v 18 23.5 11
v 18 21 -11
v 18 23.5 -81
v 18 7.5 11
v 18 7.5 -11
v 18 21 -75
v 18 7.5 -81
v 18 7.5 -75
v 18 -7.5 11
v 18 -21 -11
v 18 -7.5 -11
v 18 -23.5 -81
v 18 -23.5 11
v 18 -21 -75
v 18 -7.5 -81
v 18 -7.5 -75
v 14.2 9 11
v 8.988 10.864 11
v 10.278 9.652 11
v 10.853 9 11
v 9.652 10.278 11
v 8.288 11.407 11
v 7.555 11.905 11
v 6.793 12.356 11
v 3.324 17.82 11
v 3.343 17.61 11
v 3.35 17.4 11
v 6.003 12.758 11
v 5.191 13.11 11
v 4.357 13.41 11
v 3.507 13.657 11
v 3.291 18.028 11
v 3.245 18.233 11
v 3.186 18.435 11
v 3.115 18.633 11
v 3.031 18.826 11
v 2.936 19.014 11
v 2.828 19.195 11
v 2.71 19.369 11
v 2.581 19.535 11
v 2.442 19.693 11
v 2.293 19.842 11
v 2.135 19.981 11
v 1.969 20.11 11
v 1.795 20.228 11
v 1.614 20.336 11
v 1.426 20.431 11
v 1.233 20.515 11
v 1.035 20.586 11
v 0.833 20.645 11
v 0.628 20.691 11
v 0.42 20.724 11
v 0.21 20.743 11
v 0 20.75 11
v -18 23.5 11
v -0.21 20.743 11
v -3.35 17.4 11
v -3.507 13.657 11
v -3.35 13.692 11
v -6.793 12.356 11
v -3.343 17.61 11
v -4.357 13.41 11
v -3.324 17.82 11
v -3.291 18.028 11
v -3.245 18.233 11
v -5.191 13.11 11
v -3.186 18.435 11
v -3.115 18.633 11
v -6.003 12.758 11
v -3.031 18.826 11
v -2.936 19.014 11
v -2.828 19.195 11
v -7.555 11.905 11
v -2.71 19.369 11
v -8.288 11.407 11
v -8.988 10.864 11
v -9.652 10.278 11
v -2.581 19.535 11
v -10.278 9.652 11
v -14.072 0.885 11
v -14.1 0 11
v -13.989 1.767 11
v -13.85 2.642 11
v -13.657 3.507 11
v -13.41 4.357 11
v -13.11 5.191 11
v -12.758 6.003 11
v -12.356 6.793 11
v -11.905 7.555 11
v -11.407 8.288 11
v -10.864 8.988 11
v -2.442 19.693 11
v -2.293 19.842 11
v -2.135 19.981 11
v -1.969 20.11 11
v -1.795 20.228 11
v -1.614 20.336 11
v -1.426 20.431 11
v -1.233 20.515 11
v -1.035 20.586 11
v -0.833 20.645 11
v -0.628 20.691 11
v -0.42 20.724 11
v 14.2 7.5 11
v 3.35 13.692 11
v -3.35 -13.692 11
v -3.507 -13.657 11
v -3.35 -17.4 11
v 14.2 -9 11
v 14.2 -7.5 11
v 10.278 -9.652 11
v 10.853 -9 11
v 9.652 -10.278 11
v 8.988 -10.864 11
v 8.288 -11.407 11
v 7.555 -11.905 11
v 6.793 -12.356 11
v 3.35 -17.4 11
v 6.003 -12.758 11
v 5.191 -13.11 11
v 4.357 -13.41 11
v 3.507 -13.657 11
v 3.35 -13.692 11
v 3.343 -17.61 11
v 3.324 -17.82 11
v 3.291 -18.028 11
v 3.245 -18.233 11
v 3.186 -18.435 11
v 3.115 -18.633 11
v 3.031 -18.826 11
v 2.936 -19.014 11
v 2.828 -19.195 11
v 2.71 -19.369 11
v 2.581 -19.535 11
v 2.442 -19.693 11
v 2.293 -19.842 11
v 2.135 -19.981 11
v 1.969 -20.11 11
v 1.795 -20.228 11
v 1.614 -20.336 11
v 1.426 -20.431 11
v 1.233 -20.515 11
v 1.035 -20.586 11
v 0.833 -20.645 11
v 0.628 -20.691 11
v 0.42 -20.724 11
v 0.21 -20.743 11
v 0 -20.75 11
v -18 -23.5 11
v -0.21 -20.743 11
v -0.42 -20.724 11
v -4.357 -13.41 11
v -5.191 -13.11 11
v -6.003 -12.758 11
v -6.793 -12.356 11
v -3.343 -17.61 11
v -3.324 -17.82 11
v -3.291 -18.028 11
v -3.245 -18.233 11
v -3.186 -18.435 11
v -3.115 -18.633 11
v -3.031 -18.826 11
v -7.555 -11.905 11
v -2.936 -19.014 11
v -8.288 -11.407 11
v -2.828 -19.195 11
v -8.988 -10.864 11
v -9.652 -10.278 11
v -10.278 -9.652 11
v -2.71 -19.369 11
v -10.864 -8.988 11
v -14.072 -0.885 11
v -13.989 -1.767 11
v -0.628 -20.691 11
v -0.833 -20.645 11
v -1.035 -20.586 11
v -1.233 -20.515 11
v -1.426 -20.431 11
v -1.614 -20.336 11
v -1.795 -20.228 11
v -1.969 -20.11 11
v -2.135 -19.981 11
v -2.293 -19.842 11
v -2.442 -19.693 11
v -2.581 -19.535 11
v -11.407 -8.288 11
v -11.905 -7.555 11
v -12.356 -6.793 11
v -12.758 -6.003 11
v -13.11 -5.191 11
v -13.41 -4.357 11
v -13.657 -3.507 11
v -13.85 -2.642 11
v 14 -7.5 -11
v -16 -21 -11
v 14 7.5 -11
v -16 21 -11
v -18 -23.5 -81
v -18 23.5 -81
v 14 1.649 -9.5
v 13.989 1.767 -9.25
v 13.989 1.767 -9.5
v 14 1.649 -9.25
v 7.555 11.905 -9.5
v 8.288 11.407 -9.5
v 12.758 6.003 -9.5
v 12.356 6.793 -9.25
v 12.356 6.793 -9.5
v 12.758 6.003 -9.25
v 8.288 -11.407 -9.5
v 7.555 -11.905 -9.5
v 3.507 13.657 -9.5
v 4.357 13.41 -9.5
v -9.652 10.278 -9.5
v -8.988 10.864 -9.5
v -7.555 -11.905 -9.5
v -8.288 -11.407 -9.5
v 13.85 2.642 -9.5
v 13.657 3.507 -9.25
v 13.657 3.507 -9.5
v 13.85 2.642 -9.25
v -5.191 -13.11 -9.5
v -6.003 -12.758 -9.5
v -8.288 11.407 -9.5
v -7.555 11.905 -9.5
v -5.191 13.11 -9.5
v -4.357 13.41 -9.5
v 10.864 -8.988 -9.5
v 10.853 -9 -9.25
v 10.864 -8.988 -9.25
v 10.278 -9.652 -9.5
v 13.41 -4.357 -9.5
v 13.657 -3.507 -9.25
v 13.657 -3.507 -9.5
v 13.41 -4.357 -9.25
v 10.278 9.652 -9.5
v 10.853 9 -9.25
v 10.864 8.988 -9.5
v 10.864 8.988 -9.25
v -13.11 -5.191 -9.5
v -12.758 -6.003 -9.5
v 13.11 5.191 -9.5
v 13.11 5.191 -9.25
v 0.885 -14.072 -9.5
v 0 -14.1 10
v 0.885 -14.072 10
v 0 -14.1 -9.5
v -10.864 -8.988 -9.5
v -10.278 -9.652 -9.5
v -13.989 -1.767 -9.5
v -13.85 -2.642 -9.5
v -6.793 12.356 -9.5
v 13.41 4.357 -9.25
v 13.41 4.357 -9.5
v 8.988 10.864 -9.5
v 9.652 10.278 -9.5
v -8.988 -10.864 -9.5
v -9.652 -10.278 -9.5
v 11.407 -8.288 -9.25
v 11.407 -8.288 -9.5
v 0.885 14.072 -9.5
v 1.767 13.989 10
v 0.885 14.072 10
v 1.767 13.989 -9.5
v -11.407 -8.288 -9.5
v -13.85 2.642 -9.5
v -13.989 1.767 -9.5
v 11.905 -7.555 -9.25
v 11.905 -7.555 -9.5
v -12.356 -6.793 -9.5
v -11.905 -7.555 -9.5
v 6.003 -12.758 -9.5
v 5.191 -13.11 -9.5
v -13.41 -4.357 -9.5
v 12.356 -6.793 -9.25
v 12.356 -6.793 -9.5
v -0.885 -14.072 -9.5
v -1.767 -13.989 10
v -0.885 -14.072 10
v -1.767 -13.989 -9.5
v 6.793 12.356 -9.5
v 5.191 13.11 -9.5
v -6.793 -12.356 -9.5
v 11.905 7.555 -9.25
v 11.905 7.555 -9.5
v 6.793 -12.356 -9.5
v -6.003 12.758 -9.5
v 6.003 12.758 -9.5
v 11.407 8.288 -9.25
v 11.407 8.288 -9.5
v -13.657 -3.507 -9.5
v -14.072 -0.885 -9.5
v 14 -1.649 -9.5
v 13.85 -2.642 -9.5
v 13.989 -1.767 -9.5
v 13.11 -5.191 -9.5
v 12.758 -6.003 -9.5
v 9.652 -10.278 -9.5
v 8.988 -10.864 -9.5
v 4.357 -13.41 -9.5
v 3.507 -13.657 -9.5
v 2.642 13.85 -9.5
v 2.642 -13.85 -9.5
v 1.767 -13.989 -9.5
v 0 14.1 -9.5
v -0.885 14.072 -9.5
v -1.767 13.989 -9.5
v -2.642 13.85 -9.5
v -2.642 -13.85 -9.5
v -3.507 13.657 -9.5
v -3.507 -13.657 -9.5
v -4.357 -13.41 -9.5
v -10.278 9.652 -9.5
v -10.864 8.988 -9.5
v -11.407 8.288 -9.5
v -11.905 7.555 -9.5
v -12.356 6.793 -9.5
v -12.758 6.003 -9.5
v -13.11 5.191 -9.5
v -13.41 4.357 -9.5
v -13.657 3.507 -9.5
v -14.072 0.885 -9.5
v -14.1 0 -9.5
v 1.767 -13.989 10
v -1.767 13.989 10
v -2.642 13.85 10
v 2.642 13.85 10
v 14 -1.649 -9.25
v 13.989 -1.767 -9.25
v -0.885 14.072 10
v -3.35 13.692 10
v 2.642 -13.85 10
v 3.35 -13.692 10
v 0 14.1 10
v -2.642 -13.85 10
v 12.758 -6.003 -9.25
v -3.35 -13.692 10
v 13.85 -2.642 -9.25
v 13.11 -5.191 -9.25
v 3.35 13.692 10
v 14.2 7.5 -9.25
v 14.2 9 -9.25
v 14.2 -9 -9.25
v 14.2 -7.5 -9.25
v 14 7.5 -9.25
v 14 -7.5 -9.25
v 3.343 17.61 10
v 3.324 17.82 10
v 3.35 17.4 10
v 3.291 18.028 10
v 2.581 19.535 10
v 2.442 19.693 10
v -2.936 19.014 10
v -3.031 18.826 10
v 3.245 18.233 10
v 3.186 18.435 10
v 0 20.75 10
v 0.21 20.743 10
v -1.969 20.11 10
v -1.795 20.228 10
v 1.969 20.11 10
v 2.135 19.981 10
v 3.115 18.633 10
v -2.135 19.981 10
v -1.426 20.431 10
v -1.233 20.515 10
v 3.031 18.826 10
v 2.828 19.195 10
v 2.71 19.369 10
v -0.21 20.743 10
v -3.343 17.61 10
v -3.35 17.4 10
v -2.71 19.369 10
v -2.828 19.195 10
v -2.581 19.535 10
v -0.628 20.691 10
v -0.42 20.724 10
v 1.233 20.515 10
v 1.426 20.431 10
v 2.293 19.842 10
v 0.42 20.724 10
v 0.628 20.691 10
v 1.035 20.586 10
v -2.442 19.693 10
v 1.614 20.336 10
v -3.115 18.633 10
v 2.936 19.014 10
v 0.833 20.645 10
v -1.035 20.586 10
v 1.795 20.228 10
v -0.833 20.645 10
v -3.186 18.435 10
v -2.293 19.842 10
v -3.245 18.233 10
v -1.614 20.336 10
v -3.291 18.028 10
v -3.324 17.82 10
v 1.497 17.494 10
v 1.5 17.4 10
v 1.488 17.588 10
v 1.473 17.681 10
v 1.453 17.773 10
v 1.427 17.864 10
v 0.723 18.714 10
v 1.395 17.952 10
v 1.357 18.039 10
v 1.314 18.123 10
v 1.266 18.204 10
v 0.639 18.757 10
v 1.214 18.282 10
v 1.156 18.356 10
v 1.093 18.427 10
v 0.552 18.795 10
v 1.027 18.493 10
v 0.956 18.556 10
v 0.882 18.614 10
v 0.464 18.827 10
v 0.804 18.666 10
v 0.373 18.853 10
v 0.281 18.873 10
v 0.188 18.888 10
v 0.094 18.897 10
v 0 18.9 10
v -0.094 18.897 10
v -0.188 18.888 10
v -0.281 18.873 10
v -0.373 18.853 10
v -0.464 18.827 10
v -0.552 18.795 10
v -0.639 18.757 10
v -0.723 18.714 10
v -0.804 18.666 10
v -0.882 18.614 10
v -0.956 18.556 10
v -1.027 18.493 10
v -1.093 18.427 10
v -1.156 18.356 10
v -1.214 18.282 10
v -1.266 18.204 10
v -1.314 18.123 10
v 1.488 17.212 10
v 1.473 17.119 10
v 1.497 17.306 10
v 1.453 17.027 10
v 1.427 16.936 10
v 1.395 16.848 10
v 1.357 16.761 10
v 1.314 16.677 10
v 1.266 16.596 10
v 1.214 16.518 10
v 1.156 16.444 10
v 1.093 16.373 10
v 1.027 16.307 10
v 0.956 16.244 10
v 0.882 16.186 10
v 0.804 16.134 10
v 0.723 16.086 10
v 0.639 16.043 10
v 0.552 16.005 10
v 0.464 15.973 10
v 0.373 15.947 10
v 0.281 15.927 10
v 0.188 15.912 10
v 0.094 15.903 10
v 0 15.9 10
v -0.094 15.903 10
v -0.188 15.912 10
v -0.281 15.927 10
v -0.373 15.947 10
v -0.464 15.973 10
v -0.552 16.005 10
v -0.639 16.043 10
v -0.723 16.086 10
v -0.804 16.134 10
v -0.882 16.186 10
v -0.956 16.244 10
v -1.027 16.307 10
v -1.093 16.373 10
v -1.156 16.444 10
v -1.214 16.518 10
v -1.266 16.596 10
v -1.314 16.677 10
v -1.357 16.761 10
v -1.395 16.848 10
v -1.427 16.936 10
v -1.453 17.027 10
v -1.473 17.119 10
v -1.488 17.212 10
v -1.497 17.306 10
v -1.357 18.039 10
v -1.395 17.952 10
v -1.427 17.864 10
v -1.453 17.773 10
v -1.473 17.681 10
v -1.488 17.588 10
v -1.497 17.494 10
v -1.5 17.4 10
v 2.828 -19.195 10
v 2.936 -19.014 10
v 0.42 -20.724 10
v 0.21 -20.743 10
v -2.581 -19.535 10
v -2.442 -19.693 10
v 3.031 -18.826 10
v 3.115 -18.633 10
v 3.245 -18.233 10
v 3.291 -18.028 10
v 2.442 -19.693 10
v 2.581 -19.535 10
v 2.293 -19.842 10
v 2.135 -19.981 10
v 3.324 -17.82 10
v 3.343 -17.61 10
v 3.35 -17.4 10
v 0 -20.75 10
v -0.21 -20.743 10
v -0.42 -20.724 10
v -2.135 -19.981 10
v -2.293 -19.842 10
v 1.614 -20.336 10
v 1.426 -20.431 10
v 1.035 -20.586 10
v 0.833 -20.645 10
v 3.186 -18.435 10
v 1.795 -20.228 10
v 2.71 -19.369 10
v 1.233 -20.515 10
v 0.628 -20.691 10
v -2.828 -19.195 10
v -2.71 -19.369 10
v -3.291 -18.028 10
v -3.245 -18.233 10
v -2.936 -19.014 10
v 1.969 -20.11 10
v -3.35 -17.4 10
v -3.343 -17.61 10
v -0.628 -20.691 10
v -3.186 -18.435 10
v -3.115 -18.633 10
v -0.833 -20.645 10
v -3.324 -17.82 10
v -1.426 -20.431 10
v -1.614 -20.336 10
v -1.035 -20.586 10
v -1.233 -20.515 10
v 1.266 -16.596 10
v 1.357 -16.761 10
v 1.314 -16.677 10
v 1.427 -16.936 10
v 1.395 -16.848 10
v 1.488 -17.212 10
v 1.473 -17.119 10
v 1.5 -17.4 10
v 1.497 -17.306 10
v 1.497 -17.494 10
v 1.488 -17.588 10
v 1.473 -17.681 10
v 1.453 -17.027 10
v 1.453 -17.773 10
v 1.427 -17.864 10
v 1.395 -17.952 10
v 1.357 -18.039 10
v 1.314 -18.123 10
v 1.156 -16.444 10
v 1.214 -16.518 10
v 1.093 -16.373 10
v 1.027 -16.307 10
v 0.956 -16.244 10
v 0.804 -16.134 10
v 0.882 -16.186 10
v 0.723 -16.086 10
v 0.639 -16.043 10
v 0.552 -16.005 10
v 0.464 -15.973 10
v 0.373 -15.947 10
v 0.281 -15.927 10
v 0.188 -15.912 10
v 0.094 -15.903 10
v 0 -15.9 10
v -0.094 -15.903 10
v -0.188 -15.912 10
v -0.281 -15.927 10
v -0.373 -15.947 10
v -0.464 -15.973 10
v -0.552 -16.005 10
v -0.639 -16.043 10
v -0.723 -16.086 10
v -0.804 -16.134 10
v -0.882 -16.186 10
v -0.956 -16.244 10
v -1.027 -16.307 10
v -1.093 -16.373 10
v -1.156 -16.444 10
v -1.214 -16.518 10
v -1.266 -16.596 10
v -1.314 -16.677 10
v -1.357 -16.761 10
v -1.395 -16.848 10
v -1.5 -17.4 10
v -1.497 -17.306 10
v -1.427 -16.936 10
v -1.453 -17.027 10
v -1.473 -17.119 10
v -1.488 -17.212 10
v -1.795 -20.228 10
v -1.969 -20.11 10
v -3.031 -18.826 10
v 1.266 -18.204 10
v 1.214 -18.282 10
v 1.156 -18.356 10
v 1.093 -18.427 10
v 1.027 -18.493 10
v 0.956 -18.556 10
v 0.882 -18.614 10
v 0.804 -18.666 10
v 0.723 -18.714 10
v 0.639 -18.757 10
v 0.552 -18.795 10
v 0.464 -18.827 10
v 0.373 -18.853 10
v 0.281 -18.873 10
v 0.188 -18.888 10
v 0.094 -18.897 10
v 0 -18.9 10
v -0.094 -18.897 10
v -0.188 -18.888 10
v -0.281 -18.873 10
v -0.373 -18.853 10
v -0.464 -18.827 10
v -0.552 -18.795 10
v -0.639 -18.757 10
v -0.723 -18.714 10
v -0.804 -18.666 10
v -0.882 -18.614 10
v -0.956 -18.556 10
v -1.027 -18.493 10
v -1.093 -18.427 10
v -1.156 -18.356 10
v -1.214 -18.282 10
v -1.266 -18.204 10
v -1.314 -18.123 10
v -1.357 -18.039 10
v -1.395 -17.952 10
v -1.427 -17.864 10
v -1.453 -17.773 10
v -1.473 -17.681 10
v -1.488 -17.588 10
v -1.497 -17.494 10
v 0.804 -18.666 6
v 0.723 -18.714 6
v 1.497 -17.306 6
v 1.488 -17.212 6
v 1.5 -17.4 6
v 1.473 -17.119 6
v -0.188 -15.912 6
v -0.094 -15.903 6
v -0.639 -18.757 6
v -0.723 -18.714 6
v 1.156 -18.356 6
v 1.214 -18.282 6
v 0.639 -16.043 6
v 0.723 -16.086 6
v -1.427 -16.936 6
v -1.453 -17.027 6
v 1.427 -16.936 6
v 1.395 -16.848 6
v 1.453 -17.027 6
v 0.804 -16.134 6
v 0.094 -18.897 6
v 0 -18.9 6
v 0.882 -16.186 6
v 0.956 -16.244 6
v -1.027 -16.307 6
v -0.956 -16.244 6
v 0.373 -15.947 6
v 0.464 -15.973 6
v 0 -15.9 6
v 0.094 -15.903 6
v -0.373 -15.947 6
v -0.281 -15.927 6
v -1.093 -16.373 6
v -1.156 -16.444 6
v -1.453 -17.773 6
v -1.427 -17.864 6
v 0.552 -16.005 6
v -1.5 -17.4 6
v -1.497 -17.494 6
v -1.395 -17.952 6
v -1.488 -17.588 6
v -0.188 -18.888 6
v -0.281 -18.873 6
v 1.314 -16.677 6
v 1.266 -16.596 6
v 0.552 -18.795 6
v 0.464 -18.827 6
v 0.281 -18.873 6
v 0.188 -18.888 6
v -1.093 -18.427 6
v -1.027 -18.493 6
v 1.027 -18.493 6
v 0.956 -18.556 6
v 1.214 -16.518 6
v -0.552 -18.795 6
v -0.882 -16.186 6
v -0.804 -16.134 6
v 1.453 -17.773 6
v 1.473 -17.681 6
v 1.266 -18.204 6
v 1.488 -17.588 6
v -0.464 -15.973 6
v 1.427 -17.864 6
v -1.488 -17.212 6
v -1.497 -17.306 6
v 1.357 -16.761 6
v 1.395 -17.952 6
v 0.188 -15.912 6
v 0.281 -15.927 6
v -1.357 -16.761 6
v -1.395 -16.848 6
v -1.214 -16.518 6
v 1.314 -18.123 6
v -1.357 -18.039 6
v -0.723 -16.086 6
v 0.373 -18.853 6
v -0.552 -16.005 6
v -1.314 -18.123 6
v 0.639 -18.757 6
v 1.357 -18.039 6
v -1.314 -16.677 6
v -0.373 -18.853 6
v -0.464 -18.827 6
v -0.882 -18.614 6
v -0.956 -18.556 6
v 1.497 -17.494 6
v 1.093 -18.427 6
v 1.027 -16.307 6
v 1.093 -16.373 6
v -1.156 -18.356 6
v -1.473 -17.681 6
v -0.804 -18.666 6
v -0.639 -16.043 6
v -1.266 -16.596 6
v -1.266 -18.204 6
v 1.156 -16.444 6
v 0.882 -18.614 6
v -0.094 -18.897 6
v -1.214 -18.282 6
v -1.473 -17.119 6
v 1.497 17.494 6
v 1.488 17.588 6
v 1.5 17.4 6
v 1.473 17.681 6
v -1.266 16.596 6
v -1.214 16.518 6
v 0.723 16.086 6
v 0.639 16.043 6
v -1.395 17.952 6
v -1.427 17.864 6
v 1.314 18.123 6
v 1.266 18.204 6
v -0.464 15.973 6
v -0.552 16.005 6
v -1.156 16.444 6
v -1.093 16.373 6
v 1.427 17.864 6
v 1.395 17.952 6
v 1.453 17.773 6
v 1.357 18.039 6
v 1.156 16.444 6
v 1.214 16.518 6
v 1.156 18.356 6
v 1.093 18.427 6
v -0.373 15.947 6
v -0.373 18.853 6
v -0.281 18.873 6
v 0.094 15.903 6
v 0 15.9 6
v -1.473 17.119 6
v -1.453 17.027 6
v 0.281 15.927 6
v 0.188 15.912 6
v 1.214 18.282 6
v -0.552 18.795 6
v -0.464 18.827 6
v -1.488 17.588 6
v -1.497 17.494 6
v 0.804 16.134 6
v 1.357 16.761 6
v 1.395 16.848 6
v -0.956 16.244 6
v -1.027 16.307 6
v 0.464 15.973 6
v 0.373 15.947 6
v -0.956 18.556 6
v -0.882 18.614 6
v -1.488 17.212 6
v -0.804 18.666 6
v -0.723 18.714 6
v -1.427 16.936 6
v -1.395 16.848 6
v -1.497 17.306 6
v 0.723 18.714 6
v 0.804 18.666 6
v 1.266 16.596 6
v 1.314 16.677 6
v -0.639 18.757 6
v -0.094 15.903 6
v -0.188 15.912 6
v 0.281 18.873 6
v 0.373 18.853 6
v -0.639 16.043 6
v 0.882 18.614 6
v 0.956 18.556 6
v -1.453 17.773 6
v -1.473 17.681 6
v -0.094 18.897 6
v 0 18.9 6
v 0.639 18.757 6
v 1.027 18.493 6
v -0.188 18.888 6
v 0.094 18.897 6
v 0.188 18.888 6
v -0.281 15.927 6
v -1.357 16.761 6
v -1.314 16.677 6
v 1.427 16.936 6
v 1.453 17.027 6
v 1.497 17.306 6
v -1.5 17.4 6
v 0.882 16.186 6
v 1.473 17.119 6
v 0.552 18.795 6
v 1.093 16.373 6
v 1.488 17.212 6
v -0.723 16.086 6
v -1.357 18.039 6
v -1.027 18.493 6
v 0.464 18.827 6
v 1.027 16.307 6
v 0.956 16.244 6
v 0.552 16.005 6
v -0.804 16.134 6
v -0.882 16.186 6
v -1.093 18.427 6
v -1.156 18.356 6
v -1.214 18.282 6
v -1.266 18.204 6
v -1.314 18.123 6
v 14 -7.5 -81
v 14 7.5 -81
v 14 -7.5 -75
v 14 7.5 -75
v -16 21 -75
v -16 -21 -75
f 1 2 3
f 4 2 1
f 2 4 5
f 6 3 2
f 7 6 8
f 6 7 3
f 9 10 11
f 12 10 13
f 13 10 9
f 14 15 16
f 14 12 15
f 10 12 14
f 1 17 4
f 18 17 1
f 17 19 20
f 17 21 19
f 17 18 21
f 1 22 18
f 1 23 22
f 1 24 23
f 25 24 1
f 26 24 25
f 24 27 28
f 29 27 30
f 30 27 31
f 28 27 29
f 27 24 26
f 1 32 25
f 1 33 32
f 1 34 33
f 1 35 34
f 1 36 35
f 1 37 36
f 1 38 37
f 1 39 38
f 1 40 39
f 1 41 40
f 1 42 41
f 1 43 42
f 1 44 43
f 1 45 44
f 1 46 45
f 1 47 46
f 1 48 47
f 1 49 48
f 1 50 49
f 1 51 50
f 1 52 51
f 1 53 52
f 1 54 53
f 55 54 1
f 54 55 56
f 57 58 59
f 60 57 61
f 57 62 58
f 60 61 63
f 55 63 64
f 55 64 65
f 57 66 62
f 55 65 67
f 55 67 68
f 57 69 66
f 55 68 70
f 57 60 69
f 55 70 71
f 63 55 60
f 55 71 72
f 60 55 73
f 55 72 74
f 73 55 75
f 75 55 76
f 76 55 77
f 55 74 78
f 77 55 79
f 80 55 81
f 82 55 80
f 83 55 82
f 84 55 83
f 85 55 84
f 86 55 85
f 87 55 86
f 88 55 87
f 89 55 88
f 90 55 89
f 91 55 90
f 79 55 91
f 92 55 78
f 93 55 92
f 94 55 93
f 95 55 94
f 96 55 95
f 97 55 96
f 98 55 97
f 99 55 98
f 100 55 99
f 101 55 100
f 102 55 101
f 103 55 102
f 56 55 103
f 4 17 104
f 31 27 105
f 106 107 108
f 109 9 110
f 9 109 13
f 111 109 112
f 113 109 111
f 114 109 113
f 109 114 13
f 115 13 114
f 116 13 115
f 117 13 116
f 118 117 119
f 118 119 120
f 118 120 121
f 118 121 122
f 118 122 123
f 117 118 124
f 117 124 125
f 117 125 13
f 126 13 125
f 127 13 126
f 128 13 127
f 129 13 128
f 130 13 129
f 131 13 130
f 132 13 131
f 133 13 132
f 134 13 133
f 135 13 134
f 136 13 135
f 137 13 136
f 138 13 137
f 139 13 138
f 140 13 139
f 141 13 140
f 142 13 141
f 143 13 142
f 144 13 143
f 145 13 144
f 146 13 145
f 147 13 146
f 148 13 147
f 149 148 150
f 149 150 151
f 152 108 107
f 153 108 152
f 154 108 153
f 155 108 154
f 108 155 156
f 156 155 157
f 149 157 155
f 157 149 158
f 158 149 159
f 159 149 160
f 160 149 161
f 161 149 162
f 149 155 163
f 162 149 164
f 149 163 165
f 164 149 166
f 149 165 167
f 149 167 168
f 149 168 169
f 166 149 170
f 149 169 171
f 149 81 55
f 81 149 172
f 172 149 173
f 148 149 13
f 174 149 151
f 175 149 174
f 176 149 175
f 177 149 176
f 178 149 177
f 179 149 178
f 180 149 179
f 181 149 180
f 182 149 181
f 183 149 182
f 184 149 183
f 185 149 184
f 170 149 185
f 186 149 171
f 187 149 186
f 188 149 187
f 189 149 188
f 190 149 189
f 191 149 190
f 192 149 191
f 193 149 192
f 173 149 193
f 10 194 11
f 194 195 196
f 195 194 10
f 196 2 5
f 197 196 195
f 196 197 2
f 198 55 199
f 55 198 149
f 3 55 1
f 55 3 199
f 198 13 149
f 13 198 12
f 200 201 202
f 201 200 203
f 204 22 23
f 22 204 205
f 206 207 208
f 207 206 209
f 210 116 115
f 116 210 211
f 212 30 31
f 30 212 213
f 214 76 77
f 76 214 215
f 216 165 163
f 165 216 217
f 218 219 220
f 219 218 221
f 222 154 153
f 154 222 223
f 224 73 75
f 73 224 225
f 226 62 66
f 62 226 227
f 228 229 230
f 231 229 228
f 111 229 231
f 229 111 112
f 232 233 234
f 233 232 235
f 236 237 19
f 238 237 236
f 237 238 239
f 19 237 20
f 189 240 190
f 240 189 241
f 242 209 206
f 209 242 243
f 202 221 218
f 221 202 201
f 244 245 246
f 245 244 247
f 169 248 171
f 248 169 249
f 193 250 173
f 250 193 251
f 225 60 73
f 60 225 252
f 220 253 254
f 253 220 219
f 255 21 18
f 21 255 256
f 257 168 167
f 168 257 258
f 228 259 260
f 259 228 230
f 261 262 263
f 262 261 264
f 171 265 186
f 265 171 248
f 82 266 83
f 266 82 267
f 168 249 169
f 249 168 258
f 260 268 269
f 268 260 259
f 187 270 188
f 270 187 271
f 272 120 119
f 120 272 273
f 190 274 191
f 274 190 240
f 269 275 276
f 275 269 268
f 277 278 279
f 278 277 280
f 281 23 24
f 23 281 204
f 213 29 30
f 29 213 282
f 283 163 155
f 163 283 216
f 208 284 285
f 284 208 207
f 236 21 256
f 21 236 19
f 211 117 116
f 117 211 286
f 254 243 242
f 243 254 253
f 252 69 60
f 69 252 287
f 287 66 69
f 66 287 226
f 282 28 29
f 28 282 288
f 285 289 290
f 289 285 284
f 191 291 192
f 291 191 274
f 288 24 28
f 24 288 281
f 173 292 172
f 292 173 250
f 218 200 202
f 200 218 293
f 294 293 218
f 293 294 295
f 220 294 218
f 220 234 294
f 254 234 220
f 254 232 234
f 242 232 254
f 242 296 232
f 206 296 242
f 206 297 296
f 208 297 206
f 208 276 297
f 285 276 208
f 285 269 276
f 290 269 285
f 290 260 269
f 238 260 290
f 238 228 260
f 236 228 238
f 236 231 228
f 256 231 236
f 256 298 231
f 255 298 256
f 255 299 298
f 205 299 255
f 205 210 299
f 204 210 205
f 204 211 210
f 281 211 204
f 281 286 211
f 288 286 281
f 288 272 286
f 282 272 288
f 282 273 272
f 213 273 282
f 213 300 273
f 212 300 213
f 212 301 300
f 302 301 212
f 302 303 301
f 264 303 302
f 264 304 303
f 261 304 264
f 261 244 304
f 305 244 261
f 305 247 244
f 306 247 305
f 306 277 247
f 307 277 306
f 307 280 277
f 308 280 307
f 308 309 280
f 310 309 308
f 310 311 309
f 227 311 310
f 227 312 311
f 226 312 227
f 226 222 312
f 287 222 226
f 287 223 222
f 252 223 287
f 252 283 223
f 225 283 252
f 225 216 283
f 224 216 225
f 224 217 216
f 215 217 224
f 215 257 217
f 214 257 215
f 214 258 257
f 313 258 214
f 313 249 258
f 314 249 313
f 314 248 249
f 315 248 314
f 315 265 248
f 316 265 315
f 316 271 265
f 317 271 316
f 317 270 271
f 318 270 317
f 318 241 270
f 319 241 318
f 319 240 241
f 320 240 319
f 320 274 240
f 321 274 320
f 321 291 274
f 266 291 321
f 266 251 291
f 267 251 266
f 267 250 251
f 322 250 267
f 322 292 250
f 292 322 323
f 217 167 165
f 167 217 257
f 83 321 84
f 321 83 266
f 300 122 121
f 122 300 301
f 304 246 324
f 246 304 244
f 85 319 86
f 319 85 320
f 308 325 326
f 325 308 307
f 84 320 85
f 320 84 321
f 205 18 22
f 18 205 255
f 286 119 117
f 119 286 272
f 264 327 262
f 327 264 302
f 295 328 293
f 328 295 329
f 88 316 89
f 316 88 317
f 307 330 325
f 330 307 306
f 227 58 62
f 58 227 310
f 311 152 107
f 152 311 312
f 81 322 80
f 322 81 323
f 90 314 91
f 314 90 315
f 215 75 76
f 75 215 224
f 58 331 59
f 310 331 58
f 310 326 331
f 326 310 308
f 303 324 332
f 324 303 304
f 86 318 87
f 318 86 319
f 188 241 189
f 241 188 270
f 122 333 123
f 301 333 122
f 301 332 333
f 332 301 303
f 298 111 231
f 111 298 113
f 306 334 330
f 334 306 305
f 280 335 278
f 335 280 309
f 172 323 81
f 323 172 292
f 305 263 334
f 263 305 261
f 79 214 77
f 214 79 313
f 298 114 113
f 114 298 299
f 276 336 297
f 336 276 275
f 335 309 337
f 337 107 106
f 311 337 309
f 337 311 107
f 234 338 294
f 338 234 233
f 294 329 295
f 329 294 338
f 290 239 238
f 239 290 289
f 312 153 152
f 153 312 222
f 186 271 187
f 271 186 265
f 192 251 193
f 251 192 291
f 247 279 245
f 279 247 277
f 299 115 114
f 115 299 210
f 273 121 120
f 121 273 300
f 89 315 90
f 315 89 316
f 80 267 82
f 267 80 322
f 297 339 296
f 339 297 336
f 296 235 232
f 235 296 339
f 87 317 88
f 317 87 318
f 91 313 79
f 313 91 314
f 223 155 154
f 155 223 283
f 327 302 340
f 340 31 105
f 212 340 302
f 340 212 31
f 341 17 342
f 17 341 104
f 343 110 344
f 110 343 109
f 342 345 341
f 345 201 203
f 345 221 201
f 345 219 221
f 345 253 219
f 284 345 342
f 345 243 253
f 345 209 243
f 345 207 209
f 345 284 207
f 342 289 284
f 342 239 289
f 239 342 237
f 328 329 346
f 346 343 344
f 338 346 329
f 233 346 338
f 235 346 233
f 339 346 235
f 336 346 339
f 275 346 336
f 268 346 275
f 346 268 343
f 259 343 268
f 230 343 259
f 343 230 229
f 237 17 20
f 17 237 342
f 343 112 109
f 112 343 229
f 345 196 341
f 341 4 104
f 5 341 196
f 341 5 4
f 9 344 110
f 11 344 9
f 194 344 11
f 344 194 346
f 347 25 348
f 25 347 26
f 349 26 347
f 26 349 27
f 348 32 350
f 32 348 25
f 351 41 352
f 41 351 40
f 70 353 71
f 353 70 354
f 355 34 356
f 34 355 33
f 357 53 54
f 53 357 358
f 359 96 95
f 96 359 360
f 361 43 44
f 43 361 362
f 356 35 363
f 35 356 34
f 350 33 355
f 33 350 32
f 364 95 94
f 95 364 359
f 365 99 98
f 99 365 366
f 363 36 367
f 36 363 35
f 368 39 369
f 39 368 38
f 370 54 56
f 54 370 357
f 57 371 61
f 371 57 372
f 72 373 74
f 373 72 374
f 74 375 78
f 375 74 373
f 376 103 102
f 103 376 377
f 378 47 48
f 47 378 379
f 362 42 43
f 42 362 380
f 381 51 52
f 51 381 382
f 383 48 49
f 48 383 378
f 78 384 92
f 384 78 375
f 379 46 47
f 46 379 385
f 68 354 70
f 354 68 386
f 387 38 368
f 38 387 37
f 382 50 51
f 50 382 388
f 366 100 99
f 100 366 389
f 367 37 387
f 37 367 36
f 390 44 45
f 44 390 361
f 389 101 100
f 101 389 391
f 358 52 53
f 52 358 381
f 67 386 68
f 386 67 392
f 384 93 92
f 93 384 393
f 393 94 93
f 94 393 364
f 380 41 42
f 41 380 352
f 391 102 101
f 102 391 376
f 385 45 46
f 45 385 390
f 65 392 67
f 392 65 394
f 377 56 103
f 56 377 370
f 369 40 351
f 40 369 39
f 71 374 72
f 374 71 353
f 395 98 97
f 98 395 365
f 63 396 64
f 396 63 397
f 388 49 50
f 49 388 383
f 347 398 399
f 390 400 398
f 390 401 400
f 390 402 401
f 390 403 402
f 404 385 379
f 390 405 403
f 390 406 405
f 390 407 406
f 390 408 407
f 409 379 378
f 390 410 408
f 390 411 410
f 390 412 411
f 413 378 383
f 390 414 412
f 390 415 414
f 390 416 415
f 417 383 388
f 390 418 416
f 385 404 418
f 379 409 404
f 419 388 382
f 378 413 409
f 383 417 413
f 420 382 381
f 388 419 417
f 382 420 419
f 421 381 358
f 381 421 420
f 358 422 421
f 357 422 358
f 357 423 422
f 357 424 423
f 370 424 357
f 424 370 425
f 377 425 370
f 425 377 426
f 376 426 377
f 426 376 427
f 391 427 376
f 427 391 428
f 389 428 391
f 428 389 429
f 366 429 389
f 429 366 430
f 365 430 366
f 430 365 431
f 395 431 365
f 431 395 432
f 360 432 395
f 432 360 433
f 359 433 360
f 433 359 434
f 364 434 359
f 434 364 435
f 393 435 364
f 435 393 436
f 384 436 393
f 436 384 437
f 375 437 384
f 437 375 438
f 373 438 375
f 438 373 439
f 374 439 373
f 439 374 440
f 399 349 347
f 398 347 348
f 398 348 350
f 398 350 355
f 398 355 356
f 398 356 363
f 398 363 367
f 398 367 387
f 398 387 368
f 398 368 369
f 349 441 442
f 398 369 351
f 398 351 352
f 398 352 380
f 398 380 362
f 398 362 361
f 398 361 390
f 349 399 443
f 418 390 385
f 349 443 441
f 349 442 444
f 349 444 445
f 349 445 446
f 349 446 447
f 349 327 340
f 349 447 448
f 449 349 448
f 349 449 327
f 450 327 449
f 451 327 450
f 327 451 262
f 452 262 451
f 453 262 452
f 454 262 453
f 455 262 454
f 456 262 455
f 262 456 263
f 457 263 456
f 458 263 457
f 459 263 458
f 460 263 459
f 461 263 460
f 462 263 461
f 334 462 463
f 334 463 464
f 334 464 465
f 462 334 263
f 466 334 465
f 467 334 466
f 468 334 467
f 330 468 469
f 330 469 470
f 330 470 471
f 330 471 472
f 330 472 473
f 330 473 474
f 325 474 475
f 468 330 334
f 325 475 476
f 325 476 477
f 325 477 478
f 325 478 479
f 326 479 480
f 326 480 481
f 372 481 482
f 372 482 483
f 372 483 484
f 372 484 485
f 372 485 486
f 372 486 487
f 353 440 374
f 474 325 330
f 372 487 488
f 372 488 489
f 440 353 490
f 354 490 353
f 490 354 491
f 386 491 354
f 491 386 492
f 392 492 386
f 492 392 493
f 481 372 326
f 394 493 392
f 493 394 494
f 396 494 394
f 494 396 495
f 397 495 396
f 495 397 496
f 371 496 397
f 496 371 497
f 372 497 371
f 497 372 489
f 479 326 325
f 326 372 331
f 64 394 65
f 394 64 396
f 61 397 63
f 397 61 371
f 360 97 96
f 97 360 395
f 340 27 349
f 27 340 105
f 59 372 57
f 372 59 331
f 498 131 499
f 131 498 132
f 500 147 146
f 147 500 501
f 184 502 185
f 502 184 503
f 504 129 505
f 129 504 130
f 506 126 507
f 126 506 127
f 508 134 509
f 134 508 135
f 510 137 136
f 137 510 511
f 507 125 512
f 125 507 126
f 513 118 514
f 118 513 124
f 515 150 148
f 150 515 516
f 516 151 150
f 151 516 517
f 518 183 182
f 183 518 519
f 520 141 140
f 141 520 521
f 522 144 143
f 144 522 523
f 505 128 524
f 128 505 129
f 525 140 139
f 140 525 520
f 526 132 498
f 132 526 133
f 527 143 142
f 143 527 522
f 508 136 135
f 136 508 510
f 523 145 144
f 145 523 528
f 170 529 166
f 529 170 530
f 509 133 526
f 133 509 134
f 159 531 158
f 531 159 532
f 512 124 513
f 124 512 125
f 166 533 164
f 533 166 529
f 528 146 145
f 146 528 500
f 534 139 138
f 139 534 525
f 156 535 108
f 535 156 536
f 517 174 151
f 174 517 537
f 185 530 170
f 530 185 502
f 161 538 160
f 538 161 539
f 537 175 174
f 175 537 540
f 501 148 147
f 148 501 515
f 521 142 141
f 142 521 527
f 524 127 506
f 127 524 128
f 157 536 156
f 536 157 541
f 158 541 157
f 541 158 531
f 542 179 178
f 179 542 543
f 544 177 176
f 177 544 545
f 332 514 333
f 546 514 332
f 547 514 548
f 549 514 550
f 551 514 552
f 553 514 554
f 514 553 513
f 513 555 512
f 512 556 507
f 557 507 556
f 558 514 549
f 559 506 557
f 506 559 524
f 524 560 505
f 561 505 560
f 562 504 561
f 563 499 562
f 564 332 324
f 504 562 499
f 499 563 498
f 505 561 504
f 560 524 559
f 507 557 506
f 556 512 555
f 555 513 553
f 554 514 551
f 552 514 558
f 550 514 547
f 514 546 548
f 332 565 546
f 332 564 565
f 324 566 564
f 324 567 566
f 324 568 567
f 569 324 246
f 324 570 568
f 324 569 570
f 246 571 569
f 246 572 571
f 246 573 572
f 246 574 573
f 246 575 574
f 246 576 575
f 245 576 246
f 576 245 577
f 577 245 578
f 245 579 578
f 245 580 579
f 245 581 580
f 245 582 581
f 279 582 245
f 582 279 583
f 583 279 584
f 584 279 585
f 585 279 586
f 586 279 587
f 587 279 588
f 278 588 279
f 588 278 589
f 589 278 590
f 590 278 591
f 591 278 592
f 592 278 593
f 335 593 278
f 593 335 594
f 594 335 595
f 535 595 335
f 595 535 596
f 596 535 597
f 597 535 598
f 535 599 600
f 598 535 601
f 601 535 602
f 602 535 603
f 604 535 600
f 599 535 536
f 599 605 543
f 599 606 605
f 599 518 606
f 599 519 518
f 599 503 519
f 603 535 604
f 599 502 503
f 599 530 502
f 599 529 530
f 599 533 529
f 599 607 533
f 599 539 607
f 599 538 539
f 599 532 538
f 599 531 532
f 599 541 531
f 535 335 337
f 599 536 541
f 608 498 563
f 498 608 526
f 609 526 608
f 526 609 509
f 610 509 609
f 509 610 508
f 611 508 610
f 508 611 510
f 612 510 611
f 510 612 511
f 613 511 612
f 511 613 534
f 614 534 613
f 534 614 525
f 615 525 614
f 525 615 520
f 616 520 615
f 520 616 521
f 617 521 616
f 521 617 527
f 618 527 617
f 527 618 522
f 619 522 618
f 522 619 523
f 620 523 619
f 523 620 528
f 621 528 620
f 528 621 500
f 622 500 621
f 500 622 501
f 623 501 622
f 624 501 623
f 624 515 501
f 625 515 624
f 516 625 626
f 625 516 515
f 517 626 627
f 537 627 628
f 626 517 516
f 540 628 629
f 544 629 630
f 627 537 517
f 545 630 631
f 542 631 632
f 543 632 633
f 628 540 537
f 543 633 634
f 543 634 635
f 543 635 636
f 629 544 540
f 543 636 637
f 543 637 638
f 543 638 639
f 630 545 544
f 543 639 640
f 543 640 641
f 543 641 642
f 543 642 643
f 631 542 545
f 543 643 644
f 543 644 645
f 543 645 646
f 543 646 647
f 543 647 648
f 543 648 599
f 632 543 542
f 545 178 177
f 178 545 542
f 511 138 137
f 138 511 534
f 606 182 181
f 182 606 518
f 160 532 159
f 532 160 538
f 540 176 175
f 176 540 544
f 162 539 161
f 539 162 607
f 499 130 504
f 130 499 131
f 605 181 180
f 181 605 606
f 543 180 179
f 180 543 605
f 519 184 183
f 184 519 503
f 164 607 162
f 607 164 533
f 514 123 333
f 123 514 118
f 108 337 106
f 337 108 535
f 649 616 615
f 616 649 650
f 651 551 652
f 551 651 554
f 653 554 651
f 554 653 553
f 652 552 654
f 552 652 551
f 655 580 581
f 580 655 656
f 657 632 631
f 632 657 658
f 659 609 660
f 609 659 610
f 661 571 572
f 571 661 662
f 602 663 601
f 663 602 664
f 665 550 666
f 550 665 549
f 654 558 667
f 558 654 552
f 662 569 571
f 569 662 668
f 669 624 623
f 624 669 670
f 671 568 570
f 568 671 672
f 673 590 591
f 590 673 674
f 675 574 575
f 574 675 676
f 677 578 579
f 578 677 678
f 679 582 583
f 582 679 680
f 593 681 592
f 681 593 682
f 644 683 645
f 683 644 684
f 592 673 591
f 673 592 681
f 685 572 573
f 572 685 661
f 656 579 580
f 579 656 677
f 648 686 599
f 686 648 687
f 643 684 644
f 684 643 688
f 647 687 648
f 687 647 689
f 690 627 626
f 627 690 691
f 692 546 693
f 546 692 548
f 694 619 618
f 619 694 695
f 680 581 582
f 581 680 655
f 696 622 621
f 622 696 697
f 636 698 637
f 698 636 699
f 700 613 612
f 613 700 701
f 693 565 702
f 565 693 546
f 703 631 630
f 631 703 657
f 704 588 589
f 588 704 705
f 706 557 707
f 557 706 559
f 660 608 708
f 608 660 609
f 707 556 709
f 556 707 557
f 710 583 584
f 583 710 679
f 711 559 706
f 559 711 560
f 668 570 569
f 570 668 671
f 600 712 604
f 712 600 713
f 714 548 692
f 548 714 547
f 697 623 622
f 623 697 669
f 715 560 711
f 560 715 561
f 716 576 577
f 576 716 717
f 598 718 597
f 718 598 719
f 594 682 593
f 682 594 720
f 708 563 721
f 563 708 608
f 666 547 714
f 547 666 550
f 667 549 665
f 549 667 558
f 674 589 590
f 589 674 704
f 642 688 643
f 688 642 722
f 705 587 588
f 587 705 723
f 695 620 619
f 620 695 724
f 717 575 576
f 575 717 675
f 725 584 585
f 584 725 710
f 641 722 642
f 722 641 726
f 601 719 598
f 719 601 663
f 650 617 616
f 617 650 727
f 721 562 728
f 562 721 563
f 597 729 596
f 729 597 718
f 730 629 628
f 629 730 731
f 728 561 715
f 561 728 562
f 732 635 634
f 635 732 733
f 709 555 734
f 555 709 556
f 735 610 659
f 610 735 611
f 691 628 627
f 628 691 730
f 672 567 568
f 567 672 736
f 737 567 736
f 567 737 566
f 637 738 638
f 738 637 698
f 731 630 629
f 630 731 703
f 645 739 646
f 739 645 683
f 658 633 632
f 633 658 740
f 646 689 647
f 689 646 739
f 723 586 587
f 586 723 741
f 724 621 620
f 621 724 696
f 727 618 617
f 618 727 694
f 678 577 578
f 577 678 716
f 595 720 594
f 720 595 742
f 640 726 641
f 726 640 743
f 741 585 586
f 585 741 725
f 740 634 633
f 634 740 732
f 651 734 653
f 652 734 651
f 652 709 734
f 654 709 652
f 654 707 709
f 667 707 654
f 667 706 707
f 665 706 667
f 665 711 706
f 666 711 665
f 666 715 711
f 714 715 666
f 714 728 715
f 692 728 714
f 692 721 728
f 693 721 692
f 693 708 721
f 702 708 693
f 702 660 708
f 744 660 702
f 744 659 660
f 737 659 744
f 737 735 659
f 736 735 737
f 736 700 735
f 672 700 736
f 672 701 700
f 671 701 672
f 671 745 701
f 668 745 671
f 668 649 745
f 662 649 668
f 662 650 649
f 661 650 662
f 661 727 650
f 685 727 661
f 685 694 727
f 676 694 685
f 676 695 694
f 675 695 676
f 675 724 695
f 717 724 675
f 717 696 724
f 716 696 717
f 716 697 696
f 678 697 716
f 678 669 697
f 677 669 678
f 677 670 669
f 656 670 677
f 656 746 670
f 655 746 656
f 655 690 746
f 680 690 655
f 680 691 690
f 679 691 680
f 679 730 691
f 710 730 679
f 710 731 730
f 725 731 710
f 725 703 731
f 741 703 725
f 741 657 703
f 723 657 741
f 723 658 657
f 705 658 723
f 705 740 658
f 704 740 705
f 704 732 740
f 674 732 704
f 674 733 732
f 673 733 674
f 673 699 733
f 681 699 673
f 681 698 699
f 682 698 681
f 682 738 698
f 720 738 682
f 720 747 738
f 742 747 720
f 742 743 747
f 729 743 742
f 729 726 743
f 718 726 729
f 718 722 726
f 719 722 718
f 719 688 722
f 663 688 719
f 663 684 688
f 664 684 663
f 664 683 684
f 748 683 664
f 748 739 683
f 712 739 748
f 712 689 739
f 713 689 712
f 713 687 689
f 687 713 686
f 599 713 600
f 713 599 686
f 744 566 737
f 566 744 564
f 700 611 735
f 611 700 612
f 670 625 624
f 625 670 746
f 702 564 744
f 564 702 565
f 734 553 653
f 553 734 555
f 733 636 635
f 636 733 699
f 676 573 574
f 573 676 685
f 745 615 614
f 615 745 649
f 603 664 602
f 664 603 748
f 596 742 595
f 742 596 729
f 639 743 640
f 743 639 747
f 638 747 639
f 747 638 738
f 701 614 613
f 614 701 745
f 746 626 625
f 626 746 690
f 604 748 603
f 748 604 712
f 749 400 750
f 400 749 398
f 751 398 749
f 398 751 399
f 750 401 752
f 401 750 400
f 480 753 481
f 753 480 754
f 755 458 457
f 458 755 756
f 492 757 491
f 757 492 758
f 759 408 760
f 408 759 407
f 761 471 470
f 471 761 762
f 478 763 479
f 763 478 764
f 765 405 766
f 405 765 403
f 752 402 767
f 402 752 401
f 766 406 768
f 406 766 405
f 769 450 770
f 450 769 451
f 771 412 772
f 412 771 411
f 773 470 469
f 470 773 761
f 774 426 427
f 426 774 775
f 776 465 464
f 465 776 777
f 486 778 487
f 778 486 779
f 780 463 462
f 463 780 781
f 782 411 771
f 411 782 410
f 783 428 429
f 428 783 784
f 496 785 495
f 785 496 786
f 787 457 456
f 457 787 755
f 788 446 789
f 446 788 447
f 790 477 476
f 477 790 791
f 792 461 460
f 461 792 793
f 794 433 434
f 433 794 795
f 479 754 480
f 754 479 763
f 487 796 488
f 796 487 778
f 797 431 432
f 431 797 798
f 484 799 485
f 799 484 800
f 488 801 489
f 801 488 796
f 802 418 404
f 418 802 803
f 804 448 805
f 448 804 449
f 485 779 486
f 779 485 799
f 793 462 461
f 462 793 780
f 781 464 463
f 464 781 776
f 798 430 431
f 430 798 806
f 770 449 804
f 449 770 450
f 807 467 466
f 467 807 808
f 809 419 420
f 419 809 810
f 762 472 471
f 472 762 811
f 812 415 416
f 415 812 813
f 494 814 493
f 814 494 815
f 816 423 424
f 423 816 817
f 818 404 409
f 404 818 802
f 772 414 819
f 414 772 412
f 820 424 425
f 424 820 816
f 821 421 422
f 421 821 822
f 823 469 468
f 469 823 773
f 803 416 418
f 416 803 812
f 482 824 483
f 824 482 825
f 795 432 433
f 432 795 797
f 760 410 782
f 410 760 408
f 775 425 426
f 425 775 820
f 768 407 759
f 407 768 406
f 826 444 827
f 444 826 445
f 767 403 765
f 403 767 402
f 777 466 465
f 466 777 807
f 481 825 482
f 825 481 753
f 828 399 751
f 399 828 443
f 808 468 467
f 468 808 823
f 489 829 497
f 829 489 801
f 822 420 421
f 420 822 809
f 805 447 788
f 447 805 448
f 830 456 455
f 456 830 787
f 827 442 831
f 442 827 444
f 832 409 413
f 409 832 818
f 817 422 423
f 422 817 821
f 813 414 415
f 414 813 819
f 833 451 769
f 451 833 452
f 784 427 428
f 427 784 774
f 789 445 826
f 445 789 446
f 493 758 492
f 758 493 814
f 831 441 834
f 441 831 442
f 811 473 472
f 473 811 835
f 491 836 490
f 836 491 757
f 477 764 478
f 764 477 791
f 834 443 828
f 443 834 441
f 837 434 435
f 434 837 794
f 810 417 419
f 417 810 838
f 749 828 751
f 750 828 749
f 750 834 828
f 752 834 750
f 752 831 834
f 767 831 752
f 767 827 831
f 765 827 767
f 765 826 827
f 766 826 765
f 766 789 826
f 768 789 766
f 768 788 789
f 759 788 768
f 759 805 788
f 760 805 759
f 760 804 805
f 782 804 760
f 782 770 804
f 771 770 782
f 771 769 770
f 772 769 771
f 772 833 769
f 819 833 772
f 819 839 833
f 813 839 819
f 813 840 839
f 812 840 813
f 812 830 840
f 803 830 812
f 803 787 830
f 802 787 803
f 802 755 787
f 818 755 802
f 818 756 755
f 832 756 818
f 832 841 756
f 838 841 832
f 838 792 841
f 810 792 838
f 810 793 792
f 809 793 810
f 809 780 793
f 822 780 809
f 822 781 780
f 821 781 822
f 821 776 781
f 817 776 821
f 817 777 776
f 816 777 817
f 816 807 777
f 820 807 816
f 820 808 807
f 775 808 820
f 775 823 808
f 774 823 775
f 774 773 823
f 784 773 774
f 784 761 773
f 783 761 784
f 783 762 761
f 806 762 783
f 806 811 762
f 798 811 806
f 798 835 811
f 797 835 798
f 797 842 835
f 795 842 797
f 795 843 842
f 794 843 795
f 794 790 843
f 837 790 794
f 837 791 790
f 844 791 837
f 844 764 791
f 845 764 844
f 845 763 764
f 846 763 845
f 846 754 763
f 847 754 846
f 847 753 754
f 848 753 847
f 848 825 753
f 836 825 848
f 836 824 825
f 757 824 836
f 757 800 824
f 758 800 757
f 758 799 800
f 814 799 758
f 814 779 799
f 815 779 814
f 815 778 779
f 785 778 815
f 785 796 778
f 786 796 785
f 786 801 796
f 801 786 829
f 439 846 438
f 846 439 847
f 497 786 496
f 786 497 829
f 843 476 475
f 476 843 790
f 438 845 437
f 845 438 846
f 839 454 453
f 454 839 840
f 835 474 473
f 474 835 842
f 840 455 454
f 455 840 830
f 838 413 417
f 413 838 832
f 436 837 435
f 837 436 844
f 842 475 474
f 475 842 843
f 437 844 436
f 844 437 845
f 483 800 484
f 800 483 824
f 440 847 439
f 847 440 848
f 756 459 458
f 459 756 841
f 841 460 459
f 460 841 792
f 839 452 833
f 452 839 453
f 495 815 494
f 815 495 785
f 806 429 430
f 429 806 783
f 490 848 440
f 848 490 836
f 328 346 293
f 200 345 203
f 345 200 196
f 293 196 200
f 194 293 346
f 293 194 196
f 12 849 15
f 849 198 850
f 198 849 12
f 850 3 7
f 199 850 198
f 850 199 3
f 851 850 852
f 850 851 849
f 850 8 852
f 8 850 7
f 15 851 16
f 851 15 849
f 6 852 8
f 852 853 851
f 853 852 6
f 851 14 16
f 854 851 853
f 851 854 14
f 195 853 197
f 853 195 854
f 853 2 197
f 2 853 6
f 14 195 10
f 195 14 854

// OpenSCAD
block_z = 22;
block_y = 47;
block_x = 36;
cylinder_cutout_depth = 25;
equipment_housing_length = 63;
equipment_housing_margin = 5;
equipment_housing_calc_length = equipment_housing_length + equipment_housing_margin;
equipment_housing_calc_width = block_y - equipment_housing_margin;
equipment_housing_calc_depth = block_x;

difference() {
  cube([block_x, block_y, block_z], center=true);
  
  color("blue") translate([0,0,3]) cylinder(r=14.1, h=cylinder_cutout_depth, $fn=100, center=true);
  color("red") translate([5.7,0,6]) cube([17,18,30.5], center=true);
  color("black") translate([10,0,6]) cube([17,15,30.5], center=true);
  
  color("purple") translate([0,17.4,10]) cylinder(r=3.35, h=2, $fn=100);
  color("orange") translate([0,14.05,11]) cube([6.7,6.7,2], center=true);
  
  color("purple") translate([0,-17.4,10]) cylinder(r=3.35, h=2, $fn=100);
  color("orange") translate([0,-14.05,11]) cube([6.7,6.7,2], center=true);

  color("green") translate([0,-17.4,6]) cylinder(r=1.5, h=5, $fn=100);
  color("green") translate([0,17.4,6]) cylinder(r=1.5, h=5, $fn=100);

  color("white") translate([14,-(7.5),-11]) cube([4,15,block_z]);

  // Cut out notches on corners for blind lip.
//  color("magenta") translate([-((block_x - 2.5)/2), ((block_y - 2.5)/2), 0]) cylinder(r= (2.5/1), h=block_z, center=true, $fn=100); // cube([2.5, 2.5, block_z], center=true);
//  color("magenta") translate([-((block_x - 2.5)/2), -((block_y - 2.5)/2), 0]) cylinder(r= (2.5/1), h=block_z, center=true, $fn=100); // cube([2.5, 2.5, block_z], center=true);
  
  //color("cyan") translate([(block_x / 2),0,-(block_z/2)]) cylinder(r=1.5, h=4, $fn=100, center=true);

}

difference() {
    color("cyan") translate([-(block_x / 2), -(block_y / 2), -((block_z / 2) + (equipment_housing_calc_length+2))]) cube([block_x, block_y, equipment_housing_calc_length+2]);
    color("white") translate([14,-(7.5),-(equipment_housing_calc_length + block_z/ 2)-2]) cube([4,15,equipment_housing_calc_length+2]);
    
    color("cyan") translate([2,0,-equipment_housing_length + block_z]) cube([equipment_housing_calc_depth,equipment_housing_calc_width,equipment_housing_calc_length], center=true);
}
